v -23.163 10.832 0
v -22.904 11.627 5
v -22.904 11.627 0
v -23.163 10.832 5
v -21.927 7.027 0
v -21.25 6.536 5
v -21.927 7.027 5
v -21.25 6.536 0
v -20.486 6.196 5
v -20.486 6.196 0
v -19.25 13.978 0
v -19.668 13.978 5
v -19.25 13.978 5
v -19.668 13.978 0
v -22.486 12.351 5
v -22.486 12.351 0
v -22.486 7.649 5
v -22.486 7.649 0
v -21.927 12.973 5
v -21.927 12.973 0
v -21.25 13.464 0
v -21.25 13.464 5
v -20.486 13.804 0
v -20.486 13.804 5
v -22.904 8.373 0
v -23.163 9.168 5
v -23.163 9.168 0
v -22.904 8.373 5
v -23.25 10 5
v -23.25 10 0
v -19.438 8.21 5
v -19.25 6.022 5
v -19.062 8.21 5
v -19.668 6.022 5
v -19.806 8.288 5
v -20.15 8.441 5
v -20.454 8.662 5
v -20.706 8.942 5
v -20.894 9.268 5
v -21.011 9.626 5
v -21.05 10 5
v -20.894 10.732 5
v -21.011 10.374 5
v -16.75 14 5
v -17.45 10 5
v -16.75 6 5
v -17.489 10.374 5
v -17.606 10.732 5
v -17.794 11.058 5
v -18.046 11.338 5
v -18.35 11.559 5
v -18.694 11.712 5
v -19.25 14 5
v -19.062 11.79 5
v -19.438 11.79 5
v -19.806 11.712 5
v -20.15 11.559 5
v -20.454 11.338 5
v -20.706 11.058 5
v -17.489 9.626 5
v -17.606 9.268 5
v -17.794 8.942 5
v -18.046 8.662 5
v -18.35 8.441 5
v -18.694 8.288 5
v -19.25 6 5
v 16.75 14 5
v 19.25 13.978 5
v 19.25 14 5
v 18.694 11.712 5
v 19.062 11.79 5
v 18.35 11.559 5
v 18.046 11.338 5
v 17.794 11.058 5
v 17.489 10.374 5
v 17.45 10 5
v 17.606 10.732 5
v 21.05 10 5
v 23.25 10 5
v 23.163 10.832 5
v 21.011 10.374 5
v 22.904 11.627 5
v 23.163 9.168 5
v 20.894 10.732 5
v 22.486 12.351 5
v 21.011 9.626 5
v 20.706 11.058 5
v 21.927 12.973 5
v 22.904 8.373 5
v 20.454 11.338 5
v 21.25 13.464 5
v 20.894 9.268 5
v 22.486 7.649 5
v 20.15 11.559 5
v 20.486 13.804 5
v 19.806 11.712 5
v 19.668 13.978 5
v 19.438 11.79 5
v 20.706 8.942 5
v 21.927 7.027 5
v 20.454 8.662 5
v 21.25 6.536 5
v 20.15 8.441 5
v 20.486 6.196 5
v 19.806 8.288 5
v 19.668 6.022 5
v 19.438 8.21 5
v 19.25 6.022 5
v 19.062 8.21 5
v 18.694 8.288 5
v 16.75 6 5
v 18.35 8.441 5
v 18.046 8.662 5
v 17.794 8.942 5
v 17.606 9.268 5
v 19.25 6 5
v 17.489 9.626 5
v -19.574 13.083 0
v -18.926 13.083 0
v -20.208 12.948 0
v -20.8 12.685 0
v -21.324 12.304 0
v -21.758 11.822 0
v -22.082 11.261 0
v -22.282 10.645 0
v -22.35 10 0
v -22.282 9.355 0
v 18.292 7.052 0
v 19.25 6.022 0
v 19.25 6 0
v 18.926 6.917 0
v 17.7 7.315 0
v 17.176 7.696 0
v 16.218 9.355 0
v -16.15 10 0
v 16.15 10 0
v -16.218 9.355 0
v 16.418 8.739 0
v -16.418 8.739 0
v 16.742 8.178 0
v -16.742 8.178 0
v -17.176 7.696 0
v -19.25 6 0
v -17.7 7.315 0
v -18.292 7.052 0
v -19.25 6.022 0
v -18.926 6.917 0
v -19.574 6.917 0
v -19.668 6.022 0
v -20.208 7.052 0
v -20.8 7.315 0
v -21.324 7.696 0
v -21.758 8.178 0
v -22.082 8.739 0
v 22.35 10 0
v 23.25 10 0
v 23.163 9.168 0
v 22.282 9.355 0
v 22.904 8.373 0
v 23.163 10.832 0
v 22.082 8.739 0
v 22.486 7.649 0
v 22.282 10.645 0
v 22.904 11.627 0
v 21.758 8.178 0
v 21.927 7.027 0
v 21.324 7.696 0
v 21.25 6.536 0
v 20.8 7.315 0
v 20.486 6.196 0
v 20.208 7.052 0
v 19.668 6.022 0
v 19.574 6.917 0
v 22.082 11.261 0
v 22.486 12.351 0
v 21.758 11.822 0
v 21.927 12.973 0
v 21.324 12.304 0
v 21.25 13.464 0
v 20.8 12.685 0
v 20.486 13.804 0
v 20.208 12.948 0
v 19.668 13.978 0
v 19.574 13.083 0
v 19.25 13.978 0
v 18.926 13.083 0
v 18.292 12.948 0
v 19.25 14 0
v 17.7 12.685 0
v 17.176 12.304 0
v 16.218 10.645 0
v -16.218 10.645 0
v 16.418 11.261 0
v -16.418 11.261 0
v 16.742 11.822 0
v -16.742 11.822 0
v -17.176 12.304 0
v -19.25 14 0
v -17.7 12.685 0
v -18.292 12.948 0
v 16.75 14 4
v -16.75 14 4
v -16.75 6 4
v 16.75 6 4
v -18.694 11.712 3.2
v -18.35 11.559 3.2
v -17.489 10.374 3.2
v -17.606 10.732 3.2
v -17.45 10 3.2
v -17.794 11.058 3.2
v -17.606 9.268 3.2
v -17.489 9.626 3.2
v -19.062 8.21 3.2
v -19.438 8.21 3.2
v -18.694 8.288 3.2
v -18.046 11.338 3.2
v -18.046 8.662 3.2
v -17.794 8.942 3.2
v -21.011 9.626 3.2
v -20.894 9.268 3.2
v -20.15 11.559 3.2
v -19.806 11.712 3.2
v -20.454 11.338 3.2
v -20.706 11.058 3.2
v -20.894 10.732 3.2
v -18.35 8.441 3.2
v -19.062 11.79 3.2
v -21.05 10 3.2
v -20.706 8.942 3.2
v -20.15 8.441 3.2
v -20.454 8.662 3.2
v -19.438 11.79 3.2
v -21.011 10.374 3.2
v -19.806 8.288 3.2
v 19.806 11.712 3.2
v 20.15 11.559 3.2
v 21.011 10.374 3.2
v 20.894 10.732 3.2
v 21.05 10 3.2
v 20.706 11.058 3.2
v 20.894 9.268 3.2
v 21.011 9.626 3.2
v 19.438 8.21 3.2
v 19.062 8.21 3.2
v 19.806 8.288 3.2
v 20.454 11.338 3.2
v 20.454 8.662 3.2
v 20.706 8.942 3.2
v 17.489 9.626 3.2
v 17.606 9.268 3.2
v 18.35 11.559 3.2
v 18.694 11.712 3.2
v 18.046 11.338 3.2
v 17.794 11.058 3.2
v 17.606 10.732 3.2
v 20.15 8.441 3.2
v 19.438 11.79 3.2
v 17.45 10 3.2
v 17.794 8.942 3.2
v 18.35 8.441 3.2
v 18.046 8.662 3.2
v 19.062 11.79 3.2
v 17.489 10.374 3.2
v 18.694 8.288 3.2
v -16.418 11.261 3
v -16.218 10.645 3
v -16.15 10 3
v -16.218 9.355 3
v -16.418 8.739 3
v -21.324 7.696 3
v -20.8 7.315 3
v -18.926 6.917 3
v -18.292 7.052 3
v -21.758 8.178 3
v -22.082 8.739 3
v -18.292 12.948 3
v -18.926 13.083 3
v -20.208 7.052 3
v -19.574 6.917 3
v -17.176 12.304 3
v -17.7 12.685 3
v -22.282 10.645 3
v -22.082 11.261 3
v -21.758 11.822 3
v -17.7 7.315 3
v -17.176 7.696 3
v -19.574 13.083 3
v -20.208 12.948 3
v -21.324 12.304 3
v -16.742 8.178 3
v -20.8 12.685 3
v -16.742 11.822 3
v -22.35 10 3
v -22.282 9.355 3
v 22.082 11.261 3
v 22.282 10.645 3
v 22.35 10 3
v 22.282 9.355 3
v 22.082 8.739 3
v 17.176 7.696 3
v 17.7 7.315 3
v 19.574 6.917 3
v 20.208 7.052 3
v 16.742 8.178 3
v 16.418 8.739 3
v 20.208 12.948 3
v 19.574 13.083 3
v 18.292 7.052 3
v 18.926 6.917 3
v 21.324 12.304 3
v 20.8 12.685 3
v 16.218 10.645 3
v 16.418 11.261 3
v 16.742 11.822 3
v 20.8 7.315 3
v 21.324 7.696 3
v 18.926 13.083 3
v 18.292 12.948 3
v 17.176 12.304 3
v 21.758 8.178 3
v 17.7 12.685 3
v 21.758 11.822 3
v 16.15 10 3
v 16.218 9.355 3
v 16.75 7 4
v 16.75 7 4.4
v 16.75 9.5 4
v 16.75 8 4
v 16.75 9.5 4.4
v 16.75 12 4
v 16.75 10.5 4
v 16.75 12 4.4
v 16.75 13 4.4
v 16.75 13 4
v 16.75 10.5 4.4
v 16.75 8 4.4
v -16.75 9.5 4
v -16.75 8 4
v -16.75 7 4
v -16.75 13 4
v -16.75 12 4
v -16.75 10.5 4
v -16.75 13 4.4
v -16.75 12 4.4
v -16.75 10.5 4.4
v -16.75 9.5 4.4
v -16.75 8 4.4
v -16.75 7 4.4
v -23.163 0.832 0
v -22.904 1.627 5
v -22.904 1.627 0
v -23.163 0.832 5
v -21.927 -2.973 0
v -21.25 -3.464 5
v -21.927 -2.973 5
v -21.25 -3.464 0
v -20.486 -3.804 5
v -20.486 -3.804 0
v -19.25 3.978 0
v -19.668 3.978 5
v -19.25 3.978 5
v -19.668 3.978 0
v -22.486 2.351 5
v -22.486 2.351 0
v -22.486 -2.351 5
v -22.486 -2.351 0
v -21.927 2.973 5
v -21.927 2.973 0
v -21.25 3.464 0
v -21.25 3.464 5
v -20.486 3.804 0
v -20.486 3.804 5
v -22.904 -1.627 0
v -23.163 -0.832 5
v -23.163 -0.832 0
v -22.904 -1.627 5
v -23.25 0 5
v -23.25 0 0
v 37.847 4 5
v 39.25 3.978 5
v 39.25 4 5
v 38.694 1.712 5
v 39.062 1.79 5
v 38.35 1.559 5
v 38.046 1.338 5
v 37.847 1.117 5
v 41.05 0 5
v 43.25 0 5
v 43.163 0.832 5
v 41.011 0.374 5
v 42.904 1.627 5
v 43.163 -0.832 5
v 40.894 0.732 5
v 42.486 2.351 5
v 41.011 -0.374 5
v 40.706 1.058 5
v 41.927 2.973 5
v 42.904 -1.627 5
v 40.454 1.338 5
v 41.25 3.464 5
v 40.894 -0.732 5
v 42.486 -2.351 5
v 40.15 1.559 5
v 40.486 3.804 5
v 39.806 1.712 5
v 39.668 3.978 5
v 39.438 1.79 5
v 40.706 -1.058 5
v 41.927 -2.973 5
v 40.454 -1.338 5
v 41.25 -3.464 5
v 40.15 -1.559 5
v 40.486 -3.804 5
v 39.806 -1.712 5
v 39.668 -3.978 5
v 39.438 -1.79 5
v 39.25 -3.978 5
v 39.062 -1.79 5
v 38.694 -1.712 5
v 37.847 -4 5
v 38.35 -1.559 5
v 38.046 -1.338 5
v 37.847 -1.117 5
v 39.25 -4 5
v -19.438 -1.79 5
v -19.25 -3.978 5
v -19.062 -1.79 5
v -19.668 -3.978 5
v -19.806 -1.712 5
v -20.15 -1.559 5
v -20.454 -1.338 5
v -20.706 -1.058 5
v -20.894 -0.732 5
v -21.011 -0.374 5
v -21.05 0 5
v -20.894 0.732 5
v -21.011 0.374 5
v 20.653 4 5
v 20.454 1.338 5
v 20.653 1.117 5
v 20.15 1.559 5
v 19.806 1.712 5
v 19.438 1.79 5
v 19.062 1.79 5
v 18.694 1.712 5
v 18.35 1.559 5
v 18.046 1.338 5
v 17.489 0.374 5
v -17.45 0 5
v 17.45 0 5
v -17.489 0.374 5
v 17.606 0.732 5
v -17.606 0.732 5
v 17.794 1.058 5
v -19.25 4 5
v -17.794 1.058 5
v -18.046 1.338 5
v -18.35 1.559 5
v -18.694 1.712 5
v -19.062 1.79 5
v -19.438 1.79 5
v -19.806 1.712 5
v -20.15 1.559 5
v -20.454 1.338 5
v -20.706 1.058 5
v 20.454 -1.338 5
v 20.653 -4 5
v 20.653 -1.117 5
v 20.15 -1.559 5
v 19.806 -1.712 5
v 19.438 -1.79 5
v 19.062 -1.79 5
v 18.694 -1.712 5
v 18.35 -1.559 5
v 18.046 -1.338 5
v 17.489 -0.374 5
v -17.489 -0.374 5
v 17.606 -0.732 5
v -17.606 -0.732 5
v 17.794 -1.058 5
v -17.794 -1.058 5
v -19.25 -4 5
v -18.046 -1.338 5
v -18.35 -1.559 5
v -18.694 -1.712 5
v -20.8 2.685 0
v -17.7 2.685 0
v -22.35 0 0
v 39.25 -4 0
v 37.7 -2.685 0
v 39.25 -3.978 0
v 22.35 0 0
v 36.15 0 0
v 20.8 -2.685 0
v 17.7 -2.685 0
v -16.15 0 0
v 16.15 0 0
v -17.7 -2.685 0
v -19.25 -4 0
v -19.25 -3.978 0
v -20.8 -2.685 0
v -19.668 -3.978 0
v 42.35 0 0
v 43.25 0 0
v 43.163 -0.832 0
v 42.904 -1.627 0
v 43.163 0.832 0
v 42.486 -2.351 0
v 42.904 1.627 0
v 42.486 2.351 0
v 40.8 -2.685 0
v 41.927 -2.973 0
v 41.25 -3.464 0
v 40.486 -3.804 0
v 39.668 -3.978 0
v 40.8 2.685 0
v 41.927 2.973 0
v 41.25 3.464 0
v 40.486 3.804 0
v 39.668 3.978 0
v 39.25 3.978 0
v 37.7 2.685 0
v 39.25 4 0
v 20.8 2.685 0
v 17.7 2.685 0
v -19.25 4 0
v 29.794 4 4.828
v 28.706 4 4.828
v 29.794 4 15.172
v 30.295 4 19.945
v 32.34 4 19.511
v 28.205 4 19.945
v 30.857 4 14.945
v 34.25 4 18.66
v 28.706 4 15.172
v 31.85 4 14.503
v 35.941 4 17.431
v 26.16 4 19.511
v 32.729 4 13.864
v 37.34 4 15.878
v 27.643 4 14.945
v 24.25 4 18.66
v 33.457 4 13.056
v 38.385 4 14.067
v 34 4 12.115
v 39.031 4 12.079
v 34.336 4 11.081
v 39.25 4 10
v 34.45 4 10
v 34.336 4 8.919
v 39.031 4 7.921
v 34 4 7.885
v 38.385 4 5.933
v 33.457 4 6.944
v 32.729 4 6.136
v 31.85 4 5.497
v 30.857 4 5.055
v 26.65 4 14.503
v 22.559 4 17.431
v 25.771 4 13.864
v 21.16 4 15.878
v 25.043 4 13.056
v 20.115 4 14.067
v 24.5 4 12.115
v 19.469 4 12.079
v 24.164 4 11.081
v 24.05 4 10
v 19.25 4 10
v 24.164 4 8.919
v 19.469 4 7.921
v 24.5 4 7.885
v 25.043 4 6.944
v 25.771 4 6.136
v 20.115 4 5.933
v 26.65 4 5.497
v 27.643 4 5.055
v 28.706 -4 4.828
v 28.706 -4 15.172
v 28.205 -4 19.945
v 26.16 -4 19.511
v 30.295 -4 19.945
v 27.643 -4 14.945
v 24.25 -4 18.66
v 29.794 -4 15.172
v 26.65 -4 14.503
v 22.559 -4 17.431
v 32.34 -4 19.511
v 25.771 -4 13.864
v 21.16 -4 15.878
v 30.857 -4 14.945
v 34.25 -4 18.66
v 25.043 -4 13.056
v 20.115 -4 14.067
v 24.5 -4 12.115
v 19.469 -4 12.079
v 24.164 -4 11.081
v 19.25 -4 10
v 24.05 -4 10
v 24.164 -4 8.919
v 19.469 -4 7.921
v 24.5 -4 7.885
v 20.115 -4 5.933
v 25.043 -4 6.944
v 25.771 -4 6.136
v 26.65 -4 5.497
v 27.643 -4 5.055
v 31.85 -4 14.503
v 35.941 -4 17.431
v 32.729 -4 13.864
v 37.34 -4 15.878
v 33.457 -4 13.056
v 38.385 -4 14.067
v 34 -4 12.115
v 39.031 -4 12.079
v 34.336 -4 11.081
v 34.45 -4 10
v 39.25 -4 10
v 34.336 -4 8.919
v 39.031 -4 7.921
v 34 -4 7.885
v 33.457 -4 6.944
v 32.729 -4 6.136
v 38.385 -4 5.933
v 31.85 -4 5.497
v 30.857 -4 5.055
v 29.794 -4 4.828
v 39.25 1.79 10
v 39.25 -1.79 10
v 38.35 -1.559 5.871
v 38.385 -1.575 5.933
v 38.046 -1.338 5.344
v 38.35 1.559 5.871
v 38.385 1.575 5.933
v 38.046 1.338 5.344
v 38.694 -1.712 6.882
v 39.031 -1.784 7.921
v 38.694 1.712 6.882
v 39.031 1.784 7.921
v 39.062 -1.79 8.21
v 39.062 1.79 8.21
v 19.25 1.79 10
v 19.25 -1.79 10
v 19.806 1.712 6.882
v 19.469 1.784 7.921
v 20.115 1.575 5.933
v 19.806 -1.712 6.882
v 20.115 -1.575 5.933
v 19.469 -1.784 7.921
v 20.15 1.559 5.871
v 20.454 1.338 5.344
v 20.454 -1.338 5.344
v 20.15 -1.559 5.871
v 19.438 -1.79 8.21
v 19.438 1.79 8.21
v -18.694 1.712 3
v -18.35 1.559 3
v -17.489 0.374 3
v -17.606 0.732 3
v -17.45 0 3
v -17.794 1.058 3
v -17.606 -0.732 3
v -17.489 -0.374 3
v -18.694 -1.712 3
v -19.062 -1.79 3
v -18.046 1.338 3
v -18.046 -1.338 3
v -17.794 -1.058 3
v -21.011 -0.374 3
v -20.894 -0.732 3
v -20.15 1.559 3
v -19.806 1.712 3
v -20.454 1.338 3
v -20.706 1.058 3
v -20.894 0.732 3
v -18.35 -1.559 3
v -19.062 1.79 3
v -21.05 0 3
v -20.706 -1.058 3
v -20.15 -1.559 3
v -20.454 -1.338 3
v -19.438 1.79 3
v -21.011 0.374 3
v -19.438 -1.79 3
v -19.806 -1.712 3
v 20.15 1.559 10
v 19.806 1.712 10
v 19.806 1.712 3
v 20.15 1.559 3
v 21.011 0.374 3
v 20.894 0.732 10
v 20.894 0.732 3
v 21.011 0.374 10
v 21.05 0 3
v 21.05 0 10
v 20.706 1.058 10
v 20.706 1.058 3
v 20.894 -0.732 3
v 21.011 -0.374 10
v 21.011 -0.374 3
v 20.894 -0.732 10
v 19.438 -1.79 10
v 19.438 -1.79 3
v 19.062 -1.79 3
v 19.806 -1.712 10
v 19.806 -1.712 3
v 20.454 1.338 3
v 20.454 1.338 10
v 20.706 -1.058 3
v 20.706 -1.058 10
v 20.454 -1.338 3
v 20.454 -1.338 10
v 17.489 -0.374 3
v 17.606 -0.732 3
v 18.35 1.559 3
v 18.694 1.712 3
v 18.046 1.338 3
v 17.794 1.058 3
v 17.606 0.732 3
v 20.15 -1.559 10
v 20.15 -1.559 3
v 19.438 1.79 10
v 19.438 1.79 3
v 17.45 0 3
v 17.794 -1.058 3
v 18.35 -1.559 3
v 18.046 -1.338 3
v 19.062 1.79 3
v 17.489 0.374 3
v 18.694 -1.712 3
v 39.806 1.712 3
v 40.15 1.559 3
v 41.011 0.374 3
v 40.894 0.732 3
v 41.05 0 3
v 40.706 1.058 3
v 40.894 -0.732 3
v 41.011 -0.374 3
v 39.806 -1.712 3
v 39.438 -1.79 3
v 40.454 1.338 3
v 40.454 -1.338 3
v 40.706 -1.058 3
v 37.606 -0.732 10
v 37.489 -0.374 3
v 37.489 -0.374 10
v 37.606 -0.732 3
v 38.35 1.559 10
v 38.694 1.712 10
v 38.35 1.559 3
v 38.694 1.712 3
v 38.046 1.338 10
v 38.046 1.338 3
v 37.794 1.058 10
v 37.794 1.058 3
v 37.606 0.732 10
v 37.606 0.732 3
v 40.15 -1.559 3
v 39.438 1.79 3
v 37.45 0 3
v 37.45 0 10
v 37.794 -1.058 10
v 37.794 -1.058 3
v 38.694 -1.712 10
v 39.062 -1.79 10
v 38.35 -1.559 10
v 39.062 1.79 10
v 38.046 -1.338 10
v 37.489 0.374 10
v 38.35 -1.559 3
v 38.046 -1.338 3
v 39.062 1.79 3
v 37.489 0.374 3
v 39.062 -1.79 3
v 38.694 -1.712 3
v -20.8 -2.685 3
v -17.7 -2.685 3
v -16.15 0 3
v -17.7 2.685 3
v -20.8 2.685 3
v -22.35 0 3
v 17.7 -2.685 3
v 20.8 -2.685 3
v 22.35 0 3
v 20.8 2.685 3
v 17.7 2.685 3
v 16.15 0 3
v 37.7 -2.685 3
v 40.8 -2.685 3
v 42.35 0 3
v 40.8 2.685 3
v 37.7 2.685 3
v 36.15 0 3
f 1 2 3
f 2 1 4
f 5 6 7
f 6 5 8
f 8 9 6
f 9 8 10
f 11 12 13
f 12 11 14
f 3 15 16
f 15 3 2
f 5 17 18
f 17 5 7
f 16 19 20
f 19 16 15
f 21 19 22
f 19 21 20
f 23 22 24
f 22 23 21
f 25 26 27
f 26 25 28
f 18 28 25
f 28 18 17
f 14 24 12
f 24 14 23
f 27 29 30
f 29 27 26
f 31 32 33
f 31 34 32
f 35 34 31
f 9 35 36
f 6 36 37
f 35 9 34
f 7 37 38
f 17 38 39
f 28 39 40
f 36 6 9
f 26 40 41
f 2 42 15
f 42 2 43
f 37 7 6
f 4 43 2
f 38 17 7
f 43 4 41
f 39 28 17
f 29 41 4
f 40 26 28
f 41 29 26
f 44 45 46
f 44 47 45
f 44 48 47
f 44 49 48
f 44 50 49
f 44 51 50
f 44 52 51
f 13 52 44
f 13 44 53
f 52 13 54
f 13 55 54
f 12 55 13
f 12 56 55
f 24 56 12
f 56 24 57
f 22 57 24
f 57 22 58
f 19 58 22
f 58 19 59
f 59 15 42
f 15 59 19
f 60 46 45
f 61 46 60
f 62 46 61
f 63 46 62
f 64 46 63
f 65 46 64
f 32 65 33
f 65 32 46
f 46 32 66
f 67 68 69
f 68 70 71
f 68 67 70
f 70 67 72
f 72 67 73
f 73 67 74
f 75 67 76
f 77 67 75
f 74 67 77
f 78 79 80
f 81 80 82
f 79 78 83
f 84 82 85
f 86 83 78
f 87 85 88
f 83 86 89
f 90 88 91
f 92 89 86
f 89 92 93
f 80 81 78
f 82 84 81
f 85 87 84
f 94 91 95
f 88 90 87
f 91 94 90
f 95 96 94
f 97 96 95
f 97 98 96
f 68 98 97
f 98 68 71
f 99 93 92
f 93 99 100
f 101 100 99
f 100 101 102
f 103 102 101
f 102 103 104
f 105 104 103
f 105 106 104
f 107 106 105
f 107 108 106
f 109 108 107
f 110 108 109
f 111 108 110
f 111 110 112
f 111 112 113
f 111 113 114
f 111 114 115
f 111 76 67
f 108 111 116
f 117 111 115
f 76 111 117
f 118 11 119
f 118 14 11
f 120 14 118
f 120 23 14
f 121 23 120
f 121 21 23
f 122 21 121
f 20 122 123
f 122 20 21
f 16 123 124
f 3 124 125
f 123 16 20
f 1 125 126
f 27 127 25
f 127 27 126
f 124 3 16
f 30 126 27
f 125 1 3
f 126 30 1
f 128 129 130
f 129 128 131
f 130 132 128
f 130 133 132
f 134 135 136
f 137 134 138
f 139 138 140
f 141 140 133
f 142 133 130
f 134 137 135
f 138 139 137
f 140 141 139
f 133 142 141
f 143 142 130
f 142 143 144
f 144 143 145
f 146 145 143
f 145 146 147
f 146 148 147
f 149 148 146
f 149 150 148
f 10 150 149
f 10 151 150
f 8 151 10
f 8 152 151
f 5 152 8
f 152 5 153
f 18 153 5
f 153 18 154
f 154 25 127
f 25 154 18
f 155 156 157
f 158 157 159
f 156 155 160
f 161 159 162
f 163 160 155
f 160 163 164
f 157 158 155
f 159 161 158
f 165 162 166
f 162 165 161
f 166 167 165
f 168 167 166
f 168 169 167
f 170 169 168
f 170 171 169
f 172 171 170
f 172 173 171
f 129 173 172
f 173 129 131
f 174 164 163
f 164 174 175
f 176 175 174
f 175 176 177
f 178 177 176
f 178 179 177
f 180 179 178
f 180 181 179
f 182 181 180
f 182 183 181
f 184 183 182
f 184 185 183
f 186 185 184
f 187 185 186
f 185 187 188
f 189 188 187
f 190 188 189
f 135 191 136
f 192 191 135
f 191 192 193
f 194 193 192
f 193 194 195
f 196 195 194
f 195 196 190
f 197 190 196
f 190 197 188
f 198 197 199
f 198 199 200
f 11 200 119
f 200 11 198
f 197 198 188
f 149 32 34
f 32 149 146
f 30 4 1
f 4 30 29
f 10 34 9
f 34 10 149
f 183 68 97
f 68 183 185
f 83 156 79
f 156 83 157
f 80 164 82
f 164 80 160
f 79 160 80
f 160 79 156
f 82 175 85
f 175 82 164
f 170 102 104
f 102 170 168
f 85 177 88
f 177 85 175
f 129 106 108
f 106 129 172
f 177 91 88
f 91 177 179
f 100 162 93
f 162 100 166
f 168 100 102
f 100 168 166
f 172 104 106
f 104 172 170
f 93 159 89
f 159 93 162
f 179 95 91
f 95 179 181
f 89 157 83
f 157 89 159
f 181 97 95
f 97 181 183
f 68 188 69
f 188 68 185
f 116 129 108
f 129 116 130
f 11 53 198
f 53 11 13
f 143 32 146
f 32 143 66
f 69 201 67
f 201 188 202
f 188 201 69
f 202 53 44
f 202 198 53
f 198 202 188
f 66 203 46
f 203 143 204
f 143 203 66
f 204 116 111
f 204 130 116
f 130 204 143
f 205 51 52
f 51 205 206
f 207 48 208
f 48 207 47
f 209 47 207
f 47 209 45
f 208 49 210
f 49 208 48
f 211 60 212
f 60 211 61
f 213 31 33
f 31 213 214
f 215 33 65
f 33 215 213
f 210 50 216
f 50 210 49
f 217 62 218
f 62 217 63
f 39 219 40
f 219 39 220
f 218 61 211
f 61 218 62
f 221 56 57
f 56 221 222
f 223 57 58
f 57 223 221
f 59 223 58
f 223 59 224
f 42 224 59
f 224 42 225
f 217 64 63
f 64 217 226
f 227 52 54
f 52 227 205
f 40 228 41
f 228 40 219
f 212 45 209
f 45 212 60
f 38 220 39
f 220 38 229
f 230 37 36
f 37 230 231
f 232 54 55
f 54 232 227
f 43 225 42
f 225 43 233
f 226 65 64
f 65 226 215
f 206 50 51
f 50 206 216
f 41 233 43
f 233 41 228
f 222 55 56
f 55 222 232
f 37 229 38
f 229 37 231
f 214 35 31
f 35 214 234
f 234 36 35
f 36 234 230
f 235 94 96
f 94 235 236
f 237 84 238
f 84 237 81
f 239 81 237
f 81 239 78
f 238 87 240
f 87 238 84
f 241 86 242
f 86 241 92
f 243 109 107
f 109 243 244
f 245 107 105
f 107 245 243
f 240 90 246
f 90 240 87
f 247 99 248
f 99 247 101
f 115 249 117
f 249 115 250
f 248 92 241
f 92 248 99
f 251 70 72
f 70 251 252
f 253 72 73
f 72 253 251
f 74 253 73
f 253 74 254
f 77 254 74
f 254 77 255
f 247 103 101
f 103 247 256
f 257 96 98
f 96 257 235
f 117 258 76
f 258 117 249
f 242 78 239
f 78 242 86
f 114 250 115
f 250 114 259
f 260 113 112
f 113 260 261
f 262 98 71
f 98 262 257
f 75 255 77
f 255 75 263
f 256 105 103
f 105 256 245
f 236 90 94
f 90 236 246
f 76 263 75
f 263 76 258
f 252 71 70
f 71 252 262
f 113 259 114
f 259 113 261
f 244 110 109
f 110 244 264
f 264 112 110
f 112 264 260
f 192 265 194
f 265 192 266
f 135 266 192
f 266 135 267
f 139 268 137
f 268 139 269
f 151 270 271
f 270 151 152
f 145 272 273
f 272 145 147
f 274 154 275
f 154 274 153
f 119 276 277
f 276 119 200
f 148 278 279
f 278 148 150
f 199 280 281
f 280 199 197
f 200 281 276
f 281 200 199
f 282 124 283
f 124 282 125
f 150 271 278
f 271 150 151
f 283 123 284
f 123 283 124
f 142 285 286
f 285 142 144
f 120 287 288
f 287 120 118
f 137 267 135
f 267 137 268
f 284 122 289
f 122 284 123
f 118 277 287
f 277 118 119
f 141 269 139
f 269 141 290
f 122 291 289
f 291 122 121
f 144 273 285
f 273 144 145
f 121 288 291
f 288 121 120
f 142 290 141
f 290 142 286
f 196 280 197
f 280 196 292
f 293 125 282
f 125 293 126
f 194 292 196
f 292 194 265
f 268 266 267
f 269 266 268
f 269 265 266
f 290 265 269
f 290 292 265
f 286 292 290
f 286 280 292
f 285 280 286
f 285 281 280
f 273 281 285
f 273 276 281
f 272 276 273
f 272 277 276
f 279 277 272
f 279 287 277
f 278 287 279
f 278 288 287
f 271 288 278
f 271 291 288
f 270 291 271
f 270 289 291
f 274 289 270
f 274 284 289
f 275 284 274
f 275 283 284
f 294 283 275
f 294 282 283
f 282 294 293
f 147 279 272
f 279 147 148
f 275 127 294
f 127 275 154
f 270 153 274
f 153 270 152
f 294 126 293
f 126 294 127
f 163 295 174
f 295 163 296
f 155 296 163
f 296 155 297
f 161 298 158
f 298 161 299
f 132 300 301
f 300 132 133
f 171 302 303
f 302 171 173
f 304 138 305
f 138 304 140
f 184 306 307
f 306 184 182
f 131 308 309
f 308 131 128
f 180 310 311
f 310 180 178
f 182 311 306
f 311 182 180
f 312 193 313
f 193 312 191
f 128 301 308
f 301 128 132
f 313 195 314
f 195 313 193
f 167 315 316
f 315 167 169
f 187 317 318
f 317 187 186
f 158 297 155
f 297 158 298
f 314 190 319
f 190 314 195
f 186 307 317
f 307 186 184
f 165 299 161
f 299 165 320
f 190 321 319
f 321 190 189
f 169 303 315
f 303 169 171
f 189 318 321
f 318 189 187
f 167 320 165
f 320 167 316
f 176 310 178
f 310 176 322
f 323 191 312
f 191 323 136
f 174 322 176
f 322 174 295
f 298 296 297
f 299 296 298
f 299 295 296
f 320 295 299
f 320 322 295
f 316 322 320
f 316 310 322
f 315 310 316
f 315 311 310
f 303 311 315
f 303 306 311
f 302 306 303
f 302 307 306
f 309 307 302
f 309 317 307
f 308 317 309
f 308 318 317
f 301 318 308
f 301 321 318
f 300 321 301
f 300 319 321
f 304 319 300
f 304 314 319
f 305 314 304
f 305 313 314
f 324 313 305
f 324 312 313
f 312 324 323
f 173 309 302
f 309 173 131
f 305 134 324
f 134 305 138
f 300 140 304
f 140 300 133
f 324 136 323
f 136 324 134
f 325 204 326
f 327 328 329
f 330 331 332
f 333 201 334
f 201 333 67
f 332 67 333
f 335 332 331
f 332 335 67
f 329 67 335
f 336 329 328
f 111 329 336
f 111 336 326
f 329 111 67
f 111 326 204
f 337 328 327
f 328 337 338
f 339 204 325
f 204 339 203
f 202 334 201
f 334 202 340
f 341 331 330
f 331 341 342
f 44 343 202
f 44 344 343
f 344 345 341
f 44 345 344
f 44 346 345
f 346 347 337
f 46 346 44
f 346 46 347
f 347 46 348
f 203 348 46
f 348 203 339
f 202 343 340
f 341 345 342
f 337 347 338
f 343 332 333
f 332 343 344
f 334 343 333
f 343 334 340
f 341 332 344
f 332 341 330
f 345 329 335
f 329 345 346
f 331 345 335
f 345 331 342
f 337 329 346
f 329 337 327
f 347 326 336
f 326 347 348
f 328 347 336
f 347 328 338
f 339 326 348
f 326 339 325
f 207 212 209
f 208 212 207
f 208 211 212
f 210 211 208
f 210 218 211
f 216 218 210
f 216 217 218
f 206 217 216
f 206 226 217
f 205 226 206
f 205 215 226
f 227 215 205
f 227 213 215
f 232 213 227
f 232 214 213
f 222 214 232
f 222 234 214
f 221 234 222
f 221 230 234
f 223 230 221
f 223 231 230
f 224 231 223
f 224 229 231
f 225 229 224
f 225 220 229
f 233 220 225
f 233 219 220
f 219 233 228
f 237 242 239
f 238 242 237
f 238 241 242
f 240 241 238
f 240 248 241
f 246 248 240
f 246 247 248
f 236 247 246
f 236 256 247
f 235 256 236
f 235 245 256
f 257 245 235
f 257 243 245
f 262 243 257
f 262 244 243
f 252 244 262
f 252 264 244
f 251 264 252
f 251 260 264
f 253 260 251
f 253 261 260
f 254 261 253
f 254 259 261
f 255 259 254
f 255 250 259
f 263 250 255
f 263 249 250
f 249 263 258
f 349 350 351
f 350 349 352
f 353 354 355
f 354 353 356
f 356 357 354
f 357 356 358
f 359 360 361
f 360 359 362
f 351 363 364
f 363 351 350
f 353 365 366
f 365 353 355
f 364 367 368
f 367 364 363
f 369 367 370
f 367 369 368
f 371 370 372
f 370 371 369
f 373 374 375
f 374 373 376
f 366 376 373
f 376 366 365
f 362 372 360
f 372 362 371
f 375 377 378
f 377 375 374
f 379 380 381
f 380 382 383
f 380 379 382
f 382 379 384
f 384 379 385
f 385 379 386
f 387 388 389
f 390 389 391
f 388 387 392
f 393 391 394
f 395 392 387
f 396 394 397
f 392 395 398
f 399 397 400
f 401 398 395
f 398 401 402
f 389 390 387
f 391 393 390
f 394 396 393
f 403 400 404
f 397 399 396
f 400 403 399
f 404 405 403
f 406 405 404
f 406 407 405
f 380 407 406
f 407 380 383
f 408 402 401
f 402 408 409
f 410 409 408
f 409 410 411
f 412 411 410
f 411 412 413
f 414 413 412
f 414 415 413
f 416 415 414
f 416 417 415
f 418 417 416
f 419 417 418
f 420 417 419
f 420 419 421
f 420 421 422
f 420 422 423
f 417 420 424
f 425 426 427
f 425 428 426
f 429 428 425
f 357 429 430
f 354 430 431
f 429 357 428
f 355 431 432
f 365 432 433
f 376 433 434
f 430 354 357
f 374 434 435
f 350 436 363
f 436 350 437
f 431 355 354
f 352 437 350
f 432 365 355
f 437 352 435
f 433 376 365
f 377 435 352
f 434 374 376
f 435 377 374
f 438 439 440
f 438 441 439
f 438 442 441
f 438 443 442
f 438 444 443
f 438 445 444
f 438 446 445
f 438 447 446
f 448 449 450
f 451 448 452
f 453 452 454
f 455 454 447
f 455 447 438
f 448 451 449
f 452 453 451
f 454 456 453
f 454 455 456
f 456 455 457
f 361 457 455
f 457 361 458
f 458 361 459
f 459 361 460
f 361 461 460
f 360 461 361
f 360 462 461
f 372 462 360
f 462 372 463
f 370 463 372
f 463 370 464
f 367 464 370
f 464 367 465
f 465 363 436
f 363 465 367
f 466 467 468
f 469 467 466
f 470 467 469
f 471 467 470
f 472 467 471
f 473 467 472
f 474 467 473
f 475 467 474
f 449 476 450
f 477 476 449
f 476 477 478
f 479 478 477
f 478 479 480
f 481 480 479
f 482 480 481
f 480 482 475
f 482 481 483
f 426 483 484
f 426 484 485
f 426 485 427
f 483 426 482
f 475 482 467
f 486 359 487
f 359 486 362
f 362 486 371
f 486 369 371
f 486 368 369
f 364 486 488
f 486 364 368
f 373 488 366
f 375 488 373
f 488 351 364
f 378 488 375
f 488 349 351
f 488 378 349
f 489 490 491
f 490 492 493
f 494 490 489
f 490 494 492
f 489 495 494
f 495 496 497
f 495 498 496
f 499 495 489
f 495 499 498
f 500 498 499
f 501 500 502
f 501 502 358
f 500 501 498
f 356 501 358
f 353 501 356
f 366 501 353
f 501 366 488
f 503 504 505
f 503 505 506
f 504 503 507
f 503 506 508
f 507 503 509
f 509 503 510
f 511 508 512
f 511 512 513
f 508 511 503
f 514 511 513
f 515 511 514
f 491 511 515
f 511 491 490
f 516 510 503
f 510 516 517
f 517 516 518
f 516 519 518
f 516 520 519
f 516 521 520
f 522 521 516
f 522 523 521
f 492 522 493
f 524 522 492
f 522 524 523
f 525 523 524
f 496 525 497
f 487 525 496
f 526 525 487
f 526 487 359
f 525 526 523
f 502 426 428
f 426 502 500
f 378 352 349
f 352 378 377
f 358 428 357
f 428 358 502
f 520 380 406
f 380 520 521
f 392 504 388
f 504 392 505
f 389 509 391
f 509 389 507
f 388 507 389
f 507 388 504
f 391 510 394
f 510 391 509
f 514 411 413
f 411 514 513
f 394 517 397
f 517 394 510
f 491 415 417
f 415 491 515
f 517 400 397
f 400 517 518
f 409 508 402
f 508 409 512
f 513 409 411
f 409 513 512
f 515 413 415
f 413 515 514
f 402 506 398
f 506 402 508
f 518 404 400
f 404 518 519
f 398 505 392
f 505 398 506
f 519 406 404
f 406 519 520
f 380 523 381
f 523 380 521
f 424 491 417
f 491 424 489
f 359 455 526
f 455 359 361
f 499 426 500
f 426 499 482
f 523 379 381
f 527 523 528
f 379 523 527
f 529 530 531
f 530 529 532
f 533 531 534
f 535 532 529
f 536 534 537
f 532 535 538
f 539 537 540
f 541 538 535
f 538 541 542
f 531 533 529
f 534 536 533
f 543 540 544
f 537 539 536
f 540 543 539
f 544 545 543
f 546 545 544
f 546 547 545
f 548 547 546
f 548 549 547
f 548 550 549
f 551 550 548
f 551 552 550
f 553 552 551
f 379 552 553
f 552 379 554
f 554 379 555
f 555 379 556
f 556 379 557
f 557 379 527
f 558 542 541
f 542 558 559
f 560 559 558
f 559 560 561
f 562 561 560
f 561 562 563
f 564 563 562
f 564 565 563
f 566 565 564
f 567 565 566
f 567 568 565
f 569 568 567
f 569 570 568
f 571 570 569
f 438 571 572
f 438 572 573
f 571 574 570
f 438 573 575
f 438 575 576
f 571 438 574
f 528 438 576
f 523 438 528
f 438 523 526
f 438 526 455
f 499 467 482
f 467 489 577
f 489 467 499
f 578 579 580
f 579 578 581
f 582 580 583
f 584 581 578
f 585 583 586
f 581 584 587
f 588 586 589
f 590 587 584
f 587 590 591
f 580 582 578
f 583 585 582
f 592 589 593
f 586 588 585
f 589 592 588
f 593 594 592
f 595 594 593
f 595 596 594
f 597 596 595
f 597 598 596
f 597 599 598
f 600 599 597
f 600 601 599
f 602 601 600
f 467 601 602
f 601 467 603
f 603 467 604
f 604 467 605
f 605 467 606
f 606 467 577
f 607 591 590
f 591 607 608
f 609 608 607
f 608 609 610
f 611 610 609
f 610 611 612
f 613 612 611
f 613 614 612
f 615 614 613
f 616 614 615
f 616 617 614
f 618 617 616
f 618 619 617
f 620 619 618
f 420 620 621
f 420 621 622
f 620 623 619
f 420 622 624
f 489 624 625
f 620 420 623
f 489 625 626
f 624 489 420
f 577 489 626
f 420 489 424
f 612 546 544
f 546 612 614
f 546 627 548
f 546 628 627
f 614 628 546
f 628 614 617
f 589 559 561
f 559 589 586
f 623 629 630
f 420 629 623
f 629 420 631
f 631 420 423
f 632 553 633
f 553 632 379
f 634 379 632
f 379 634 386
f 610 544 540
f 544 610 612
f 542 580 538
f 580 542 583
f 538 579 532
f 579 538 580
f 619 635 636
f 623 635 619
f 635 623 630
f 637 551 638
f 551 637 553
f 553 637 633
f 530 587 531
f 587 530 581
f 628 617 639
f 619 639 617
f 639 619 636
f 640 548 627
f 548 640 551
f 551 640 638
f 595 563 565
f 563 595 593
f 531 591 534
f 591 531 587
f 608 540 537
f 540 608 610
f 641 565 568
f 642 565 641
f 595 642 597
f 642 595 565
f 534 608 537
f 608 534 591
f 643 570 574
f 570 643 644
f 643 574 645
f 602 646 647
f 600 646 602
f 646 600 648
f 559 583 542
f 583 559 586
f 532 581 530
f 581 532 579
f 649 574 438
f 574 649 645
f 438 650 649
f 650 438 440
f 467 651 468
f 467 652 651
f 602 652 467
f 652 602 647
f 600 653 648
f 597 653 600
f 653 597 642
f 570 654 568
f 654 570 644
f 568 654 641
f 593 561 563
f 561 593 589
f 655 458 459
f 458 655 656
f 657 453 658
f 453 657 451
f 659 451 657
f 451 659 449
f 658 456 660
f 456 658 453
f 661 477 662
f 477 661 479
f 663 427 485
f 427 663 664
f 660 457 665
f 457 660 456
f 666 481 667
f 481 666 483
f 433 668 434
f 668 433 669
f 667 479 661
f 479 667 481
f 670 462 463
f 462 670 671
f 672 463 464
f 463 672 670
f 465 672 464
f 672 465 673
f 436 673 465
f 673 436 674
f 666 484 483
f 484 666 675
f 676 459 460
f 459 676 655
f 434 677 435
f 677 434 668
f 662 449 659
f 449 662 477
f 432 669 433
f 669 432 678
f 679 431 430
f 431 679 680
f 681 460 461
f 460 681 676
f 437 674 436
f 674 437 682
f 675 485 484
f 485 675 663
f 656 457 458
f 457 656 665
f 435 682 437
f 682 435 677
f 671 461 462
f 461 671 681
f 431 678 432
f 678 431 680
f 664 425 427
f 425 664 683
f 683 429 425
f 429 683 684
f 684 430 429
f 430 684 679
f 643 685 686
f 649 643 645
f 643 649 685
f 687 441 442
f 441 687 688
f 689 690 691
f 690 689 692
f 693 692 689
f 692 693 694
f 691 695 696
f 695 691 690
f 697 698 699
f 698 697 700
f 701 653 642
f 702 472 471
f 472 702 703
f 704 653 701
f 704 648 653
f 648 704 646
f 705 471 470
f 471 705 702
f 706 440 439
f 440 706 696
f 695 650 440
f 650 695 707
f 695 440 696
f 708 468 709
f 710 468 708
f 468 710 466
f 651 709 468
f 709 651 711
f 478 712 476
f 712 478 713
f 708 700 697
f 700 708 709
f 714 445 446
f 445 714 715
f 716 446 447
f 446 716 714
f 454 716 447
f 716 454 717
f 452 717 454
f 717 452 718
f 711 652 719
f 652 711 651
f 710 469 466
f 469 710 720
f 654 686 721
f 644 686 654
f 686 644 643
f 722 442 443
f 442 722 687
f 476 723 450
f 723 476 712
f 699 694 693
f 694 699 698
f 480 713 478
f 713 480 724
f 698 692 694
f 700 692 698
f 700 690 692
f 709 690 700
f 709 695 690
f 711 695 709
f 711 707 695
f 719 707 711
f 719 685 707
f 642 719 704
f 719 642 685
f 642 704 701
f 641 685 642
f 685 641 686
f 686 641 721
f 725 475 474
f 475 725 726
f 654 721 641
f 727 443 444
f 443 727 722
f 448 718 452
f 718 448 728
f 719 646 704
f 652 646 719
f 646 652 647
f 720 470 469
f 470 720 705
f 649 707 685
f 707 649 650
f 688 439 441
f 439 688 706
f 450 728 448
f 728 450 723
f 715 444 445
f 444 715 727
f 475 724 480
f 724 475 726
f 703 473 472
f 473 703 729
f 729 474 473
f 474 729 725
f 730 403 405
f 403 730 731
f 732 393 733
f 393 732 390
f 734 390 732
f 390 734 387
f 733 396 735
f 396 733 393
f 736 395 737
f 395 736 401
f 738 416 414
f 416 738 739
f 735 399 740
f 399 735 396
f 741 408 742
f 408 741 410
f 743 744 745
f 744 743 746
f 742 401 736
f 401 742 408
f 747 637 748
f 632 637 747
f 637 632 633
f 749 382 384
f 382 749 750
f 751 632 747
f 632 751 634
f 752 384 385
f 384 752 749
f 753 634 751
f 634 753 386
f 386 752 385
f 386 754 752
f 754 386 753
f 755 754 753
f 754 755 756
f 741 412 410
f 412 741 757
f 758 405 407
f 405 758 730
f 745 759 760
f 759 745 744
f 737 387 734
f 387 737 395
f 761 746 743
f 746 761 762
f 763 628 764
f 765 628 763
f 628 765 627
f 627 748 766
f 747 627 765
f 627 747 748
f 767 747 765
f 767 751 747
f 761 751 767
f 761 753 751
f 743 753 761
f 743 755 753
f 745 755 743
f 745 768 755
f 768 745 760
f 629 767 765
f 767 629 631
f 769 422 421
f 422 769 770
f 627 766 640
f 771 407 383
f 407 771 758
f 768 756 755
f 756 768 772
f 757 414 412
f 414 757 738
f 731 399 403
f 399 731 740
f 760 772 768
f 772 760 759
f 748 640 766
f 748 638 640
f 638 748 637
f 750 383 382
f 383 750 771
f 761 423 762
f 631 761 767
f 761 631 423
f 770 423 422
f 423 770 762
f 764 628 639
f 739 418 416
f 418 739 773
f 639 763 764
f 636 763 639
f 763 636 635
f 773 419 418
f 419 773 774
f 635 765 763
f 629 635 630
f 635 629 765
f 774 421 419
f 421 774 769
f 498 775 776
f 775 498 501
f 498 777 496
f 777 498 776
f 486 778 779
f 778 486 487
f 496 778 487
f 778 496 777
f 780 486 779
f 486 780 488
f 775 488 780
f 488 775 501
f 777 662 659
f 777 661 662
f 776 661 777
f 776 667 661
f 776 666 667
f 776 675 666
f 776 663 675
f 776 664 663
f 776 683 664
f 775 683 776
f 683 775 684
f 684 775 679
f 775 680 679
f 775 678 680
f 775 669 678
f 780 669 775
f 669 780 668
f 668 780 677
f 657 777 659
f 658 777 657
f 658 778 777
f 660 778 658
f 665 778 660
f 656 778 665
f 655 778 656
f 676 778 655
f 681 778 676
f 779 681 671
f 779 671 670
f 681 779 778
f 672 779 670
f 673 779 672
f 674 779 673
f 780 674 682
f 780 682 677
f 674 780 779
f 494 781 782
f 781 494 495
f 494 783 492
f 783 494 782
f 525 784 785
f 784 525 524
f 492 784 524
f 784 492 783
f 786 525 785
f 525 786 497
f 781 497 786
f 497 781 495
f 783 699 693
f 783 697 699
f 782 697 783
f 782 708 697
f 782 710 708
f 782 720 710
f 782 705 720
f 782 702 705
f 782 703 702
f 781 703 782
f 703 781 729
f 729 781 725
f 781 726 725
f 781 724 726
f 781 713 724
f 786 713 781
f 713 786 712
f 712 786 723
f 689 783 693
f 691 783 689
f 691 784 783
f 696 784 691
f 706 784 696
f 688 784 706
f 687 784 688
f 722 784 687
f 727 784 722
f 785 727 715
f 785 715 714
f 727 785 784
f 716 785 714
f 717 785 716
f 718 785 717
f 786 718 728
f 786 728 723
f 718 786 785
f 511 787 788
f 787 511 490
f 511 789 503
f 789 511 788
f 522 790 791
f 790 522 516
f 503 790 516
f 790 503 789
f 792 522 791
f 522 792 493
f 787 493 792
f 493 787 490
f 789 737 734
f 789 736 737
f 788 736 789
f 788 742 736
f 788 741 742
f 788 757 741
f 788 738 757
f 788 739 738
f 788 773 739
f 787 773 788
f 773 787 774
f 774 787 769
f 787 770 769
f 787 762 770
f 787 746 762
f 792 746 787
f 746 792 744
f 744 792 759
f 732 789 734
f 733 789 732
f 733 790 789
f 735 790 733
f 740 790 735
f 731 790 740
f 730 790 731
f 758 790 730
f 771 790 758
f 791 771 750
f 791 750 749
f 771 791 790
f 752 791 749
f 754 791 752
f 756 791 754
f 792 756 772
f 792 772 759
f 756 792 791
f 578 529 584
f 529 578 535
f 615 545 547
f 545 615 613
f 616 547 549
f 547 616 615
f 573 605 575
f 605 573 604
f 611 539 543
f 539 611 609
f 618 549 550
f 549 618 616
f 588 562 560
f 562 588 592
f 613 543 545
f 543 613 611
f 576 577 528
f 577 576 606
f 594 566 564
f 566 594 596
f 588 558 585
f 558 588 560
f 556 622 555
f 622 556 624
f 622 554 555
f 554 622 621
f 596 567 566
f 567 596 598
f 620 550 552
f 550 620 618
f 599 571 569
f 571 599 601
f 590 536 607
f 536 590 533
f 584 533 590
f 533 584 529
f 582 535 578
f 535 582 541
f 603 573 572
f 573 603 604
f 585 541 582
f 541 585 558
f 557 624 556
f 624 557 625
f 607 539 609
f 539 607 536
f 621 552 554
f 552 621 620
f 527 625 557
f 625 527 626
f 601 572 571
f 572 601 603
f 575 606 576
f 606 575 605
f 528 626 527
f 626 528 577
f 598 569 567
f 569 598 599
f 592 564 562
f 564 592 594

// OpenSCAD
/*
info
*/

//globals
ribbon 	= 	33.5;		//ribbon cable width
fixing	= 	ribbon+5;
layer	=	0.2;			//layer height
offset	=	20;			//offset distance for clamp from threaded rod


//clamp();
translate([0,10,0]) clamp();
bracket();

module clamp(){
difference(){
union(){
//body
translate([-fixing/2,0,0]) cylinder(r=4,h=5,$fn=30);
translate([fixing/2,0,0]) cylinder(r=4,h=5,$fn=30);
translate([0,0,2.5]) cube(([fixing,8,5]),center=true);
}

union(){
//screw holes
translate([-fixing/2,0,0]) cylinder(r=1.8,h=10,$fn=30);
translate([fixing/2,0,0]) cylinder(r=1.8,h=10,$fn=30);
//screw head holes
translate([-fixing/2,0,-1]) cylinder(r=3.1,h=4,$fn=30);
translate([fixing/2,0,-1]) cylinder(r=3.1,h=4,$fn=30);
//cable
translate([0,0,5]) cube(([ribbon,10,2]),center=true);
}
}
//ribs
translate([0,2.5,0.2+4]) cube(([ribbon,1,0.4]),center=true);
translate([0,0,0.2+4]) cube(([ribbon,1,0.4]),center=true);
translate([0,-2.5,0.2+4]) cube(([ribbon,1,0.4]),center=true);
//printable supports
translate([-fixing/2,0,3]) cylinder(r=4,h=layer,$fn=30);
translate([fixing/2,0,3]) cylinder(r=4,h=layer,$fn=30);
}

module bracket(){
difference(){
union(){
//body
translate([-fixing/2,0,0]) cylinder(r=4,h=5,$fn=30);
translate([fixing/2+offset,0,0]) cylinder(r=4,h=5,$fn=30);
translate([offset/2,0,2.5]) cube(([fixing+offset,8,5]),center=true);
//bar clamp
translate([(fixing/2)+offset/2,4,10]) rotate([90,0,0]) cylinder(r=10,h=8,$fn=30);
}

union(){
//screw holes
//translate([-fixing/2,0,0]) rotate([0,90,0]) #teardrop(r=1.7,h=50,$fn=20);
translate([-fixing/2,0,0]) cylinder(r=1.8,h=10,$fn=30);
translate([fixing/2,0,0]) cylinder(r=1.8,h=10,$fn=30);
translate([fixing/2+offset,0,0]) cylinder(r=1.8,h=10,$fn=30);
//nut catchers
translate([-fixing/2,0,-1]) cylinder(r=3.1,h=4,$fn=6);
translate([fixing/2,0,-1]) cylinder(r=3.1,h=4,$fn=6);
translate([fixing/2+offset,0,-1]) cylinder(r=3.1,h=4,$fn=6);
//bar clamp
translate([(fixing/2)+offset/2,6,10]) rotate([90,0,0]) cylinder(r=5.2,h=12,$fn=30);
}
}
}

module teardrop (r=8,h=20)
{
rotate([-270,0,90])
linear_extrude(height=h)
{
circle(r=r);
polygon(points=[[0,0],[r*cos(30),r*sin(30)],[0.5*r,r],[-0.5*r,r],[-r*cos(30),r*sin(30)]],
paths=[[0,1,2,3,4]]);
}
}
